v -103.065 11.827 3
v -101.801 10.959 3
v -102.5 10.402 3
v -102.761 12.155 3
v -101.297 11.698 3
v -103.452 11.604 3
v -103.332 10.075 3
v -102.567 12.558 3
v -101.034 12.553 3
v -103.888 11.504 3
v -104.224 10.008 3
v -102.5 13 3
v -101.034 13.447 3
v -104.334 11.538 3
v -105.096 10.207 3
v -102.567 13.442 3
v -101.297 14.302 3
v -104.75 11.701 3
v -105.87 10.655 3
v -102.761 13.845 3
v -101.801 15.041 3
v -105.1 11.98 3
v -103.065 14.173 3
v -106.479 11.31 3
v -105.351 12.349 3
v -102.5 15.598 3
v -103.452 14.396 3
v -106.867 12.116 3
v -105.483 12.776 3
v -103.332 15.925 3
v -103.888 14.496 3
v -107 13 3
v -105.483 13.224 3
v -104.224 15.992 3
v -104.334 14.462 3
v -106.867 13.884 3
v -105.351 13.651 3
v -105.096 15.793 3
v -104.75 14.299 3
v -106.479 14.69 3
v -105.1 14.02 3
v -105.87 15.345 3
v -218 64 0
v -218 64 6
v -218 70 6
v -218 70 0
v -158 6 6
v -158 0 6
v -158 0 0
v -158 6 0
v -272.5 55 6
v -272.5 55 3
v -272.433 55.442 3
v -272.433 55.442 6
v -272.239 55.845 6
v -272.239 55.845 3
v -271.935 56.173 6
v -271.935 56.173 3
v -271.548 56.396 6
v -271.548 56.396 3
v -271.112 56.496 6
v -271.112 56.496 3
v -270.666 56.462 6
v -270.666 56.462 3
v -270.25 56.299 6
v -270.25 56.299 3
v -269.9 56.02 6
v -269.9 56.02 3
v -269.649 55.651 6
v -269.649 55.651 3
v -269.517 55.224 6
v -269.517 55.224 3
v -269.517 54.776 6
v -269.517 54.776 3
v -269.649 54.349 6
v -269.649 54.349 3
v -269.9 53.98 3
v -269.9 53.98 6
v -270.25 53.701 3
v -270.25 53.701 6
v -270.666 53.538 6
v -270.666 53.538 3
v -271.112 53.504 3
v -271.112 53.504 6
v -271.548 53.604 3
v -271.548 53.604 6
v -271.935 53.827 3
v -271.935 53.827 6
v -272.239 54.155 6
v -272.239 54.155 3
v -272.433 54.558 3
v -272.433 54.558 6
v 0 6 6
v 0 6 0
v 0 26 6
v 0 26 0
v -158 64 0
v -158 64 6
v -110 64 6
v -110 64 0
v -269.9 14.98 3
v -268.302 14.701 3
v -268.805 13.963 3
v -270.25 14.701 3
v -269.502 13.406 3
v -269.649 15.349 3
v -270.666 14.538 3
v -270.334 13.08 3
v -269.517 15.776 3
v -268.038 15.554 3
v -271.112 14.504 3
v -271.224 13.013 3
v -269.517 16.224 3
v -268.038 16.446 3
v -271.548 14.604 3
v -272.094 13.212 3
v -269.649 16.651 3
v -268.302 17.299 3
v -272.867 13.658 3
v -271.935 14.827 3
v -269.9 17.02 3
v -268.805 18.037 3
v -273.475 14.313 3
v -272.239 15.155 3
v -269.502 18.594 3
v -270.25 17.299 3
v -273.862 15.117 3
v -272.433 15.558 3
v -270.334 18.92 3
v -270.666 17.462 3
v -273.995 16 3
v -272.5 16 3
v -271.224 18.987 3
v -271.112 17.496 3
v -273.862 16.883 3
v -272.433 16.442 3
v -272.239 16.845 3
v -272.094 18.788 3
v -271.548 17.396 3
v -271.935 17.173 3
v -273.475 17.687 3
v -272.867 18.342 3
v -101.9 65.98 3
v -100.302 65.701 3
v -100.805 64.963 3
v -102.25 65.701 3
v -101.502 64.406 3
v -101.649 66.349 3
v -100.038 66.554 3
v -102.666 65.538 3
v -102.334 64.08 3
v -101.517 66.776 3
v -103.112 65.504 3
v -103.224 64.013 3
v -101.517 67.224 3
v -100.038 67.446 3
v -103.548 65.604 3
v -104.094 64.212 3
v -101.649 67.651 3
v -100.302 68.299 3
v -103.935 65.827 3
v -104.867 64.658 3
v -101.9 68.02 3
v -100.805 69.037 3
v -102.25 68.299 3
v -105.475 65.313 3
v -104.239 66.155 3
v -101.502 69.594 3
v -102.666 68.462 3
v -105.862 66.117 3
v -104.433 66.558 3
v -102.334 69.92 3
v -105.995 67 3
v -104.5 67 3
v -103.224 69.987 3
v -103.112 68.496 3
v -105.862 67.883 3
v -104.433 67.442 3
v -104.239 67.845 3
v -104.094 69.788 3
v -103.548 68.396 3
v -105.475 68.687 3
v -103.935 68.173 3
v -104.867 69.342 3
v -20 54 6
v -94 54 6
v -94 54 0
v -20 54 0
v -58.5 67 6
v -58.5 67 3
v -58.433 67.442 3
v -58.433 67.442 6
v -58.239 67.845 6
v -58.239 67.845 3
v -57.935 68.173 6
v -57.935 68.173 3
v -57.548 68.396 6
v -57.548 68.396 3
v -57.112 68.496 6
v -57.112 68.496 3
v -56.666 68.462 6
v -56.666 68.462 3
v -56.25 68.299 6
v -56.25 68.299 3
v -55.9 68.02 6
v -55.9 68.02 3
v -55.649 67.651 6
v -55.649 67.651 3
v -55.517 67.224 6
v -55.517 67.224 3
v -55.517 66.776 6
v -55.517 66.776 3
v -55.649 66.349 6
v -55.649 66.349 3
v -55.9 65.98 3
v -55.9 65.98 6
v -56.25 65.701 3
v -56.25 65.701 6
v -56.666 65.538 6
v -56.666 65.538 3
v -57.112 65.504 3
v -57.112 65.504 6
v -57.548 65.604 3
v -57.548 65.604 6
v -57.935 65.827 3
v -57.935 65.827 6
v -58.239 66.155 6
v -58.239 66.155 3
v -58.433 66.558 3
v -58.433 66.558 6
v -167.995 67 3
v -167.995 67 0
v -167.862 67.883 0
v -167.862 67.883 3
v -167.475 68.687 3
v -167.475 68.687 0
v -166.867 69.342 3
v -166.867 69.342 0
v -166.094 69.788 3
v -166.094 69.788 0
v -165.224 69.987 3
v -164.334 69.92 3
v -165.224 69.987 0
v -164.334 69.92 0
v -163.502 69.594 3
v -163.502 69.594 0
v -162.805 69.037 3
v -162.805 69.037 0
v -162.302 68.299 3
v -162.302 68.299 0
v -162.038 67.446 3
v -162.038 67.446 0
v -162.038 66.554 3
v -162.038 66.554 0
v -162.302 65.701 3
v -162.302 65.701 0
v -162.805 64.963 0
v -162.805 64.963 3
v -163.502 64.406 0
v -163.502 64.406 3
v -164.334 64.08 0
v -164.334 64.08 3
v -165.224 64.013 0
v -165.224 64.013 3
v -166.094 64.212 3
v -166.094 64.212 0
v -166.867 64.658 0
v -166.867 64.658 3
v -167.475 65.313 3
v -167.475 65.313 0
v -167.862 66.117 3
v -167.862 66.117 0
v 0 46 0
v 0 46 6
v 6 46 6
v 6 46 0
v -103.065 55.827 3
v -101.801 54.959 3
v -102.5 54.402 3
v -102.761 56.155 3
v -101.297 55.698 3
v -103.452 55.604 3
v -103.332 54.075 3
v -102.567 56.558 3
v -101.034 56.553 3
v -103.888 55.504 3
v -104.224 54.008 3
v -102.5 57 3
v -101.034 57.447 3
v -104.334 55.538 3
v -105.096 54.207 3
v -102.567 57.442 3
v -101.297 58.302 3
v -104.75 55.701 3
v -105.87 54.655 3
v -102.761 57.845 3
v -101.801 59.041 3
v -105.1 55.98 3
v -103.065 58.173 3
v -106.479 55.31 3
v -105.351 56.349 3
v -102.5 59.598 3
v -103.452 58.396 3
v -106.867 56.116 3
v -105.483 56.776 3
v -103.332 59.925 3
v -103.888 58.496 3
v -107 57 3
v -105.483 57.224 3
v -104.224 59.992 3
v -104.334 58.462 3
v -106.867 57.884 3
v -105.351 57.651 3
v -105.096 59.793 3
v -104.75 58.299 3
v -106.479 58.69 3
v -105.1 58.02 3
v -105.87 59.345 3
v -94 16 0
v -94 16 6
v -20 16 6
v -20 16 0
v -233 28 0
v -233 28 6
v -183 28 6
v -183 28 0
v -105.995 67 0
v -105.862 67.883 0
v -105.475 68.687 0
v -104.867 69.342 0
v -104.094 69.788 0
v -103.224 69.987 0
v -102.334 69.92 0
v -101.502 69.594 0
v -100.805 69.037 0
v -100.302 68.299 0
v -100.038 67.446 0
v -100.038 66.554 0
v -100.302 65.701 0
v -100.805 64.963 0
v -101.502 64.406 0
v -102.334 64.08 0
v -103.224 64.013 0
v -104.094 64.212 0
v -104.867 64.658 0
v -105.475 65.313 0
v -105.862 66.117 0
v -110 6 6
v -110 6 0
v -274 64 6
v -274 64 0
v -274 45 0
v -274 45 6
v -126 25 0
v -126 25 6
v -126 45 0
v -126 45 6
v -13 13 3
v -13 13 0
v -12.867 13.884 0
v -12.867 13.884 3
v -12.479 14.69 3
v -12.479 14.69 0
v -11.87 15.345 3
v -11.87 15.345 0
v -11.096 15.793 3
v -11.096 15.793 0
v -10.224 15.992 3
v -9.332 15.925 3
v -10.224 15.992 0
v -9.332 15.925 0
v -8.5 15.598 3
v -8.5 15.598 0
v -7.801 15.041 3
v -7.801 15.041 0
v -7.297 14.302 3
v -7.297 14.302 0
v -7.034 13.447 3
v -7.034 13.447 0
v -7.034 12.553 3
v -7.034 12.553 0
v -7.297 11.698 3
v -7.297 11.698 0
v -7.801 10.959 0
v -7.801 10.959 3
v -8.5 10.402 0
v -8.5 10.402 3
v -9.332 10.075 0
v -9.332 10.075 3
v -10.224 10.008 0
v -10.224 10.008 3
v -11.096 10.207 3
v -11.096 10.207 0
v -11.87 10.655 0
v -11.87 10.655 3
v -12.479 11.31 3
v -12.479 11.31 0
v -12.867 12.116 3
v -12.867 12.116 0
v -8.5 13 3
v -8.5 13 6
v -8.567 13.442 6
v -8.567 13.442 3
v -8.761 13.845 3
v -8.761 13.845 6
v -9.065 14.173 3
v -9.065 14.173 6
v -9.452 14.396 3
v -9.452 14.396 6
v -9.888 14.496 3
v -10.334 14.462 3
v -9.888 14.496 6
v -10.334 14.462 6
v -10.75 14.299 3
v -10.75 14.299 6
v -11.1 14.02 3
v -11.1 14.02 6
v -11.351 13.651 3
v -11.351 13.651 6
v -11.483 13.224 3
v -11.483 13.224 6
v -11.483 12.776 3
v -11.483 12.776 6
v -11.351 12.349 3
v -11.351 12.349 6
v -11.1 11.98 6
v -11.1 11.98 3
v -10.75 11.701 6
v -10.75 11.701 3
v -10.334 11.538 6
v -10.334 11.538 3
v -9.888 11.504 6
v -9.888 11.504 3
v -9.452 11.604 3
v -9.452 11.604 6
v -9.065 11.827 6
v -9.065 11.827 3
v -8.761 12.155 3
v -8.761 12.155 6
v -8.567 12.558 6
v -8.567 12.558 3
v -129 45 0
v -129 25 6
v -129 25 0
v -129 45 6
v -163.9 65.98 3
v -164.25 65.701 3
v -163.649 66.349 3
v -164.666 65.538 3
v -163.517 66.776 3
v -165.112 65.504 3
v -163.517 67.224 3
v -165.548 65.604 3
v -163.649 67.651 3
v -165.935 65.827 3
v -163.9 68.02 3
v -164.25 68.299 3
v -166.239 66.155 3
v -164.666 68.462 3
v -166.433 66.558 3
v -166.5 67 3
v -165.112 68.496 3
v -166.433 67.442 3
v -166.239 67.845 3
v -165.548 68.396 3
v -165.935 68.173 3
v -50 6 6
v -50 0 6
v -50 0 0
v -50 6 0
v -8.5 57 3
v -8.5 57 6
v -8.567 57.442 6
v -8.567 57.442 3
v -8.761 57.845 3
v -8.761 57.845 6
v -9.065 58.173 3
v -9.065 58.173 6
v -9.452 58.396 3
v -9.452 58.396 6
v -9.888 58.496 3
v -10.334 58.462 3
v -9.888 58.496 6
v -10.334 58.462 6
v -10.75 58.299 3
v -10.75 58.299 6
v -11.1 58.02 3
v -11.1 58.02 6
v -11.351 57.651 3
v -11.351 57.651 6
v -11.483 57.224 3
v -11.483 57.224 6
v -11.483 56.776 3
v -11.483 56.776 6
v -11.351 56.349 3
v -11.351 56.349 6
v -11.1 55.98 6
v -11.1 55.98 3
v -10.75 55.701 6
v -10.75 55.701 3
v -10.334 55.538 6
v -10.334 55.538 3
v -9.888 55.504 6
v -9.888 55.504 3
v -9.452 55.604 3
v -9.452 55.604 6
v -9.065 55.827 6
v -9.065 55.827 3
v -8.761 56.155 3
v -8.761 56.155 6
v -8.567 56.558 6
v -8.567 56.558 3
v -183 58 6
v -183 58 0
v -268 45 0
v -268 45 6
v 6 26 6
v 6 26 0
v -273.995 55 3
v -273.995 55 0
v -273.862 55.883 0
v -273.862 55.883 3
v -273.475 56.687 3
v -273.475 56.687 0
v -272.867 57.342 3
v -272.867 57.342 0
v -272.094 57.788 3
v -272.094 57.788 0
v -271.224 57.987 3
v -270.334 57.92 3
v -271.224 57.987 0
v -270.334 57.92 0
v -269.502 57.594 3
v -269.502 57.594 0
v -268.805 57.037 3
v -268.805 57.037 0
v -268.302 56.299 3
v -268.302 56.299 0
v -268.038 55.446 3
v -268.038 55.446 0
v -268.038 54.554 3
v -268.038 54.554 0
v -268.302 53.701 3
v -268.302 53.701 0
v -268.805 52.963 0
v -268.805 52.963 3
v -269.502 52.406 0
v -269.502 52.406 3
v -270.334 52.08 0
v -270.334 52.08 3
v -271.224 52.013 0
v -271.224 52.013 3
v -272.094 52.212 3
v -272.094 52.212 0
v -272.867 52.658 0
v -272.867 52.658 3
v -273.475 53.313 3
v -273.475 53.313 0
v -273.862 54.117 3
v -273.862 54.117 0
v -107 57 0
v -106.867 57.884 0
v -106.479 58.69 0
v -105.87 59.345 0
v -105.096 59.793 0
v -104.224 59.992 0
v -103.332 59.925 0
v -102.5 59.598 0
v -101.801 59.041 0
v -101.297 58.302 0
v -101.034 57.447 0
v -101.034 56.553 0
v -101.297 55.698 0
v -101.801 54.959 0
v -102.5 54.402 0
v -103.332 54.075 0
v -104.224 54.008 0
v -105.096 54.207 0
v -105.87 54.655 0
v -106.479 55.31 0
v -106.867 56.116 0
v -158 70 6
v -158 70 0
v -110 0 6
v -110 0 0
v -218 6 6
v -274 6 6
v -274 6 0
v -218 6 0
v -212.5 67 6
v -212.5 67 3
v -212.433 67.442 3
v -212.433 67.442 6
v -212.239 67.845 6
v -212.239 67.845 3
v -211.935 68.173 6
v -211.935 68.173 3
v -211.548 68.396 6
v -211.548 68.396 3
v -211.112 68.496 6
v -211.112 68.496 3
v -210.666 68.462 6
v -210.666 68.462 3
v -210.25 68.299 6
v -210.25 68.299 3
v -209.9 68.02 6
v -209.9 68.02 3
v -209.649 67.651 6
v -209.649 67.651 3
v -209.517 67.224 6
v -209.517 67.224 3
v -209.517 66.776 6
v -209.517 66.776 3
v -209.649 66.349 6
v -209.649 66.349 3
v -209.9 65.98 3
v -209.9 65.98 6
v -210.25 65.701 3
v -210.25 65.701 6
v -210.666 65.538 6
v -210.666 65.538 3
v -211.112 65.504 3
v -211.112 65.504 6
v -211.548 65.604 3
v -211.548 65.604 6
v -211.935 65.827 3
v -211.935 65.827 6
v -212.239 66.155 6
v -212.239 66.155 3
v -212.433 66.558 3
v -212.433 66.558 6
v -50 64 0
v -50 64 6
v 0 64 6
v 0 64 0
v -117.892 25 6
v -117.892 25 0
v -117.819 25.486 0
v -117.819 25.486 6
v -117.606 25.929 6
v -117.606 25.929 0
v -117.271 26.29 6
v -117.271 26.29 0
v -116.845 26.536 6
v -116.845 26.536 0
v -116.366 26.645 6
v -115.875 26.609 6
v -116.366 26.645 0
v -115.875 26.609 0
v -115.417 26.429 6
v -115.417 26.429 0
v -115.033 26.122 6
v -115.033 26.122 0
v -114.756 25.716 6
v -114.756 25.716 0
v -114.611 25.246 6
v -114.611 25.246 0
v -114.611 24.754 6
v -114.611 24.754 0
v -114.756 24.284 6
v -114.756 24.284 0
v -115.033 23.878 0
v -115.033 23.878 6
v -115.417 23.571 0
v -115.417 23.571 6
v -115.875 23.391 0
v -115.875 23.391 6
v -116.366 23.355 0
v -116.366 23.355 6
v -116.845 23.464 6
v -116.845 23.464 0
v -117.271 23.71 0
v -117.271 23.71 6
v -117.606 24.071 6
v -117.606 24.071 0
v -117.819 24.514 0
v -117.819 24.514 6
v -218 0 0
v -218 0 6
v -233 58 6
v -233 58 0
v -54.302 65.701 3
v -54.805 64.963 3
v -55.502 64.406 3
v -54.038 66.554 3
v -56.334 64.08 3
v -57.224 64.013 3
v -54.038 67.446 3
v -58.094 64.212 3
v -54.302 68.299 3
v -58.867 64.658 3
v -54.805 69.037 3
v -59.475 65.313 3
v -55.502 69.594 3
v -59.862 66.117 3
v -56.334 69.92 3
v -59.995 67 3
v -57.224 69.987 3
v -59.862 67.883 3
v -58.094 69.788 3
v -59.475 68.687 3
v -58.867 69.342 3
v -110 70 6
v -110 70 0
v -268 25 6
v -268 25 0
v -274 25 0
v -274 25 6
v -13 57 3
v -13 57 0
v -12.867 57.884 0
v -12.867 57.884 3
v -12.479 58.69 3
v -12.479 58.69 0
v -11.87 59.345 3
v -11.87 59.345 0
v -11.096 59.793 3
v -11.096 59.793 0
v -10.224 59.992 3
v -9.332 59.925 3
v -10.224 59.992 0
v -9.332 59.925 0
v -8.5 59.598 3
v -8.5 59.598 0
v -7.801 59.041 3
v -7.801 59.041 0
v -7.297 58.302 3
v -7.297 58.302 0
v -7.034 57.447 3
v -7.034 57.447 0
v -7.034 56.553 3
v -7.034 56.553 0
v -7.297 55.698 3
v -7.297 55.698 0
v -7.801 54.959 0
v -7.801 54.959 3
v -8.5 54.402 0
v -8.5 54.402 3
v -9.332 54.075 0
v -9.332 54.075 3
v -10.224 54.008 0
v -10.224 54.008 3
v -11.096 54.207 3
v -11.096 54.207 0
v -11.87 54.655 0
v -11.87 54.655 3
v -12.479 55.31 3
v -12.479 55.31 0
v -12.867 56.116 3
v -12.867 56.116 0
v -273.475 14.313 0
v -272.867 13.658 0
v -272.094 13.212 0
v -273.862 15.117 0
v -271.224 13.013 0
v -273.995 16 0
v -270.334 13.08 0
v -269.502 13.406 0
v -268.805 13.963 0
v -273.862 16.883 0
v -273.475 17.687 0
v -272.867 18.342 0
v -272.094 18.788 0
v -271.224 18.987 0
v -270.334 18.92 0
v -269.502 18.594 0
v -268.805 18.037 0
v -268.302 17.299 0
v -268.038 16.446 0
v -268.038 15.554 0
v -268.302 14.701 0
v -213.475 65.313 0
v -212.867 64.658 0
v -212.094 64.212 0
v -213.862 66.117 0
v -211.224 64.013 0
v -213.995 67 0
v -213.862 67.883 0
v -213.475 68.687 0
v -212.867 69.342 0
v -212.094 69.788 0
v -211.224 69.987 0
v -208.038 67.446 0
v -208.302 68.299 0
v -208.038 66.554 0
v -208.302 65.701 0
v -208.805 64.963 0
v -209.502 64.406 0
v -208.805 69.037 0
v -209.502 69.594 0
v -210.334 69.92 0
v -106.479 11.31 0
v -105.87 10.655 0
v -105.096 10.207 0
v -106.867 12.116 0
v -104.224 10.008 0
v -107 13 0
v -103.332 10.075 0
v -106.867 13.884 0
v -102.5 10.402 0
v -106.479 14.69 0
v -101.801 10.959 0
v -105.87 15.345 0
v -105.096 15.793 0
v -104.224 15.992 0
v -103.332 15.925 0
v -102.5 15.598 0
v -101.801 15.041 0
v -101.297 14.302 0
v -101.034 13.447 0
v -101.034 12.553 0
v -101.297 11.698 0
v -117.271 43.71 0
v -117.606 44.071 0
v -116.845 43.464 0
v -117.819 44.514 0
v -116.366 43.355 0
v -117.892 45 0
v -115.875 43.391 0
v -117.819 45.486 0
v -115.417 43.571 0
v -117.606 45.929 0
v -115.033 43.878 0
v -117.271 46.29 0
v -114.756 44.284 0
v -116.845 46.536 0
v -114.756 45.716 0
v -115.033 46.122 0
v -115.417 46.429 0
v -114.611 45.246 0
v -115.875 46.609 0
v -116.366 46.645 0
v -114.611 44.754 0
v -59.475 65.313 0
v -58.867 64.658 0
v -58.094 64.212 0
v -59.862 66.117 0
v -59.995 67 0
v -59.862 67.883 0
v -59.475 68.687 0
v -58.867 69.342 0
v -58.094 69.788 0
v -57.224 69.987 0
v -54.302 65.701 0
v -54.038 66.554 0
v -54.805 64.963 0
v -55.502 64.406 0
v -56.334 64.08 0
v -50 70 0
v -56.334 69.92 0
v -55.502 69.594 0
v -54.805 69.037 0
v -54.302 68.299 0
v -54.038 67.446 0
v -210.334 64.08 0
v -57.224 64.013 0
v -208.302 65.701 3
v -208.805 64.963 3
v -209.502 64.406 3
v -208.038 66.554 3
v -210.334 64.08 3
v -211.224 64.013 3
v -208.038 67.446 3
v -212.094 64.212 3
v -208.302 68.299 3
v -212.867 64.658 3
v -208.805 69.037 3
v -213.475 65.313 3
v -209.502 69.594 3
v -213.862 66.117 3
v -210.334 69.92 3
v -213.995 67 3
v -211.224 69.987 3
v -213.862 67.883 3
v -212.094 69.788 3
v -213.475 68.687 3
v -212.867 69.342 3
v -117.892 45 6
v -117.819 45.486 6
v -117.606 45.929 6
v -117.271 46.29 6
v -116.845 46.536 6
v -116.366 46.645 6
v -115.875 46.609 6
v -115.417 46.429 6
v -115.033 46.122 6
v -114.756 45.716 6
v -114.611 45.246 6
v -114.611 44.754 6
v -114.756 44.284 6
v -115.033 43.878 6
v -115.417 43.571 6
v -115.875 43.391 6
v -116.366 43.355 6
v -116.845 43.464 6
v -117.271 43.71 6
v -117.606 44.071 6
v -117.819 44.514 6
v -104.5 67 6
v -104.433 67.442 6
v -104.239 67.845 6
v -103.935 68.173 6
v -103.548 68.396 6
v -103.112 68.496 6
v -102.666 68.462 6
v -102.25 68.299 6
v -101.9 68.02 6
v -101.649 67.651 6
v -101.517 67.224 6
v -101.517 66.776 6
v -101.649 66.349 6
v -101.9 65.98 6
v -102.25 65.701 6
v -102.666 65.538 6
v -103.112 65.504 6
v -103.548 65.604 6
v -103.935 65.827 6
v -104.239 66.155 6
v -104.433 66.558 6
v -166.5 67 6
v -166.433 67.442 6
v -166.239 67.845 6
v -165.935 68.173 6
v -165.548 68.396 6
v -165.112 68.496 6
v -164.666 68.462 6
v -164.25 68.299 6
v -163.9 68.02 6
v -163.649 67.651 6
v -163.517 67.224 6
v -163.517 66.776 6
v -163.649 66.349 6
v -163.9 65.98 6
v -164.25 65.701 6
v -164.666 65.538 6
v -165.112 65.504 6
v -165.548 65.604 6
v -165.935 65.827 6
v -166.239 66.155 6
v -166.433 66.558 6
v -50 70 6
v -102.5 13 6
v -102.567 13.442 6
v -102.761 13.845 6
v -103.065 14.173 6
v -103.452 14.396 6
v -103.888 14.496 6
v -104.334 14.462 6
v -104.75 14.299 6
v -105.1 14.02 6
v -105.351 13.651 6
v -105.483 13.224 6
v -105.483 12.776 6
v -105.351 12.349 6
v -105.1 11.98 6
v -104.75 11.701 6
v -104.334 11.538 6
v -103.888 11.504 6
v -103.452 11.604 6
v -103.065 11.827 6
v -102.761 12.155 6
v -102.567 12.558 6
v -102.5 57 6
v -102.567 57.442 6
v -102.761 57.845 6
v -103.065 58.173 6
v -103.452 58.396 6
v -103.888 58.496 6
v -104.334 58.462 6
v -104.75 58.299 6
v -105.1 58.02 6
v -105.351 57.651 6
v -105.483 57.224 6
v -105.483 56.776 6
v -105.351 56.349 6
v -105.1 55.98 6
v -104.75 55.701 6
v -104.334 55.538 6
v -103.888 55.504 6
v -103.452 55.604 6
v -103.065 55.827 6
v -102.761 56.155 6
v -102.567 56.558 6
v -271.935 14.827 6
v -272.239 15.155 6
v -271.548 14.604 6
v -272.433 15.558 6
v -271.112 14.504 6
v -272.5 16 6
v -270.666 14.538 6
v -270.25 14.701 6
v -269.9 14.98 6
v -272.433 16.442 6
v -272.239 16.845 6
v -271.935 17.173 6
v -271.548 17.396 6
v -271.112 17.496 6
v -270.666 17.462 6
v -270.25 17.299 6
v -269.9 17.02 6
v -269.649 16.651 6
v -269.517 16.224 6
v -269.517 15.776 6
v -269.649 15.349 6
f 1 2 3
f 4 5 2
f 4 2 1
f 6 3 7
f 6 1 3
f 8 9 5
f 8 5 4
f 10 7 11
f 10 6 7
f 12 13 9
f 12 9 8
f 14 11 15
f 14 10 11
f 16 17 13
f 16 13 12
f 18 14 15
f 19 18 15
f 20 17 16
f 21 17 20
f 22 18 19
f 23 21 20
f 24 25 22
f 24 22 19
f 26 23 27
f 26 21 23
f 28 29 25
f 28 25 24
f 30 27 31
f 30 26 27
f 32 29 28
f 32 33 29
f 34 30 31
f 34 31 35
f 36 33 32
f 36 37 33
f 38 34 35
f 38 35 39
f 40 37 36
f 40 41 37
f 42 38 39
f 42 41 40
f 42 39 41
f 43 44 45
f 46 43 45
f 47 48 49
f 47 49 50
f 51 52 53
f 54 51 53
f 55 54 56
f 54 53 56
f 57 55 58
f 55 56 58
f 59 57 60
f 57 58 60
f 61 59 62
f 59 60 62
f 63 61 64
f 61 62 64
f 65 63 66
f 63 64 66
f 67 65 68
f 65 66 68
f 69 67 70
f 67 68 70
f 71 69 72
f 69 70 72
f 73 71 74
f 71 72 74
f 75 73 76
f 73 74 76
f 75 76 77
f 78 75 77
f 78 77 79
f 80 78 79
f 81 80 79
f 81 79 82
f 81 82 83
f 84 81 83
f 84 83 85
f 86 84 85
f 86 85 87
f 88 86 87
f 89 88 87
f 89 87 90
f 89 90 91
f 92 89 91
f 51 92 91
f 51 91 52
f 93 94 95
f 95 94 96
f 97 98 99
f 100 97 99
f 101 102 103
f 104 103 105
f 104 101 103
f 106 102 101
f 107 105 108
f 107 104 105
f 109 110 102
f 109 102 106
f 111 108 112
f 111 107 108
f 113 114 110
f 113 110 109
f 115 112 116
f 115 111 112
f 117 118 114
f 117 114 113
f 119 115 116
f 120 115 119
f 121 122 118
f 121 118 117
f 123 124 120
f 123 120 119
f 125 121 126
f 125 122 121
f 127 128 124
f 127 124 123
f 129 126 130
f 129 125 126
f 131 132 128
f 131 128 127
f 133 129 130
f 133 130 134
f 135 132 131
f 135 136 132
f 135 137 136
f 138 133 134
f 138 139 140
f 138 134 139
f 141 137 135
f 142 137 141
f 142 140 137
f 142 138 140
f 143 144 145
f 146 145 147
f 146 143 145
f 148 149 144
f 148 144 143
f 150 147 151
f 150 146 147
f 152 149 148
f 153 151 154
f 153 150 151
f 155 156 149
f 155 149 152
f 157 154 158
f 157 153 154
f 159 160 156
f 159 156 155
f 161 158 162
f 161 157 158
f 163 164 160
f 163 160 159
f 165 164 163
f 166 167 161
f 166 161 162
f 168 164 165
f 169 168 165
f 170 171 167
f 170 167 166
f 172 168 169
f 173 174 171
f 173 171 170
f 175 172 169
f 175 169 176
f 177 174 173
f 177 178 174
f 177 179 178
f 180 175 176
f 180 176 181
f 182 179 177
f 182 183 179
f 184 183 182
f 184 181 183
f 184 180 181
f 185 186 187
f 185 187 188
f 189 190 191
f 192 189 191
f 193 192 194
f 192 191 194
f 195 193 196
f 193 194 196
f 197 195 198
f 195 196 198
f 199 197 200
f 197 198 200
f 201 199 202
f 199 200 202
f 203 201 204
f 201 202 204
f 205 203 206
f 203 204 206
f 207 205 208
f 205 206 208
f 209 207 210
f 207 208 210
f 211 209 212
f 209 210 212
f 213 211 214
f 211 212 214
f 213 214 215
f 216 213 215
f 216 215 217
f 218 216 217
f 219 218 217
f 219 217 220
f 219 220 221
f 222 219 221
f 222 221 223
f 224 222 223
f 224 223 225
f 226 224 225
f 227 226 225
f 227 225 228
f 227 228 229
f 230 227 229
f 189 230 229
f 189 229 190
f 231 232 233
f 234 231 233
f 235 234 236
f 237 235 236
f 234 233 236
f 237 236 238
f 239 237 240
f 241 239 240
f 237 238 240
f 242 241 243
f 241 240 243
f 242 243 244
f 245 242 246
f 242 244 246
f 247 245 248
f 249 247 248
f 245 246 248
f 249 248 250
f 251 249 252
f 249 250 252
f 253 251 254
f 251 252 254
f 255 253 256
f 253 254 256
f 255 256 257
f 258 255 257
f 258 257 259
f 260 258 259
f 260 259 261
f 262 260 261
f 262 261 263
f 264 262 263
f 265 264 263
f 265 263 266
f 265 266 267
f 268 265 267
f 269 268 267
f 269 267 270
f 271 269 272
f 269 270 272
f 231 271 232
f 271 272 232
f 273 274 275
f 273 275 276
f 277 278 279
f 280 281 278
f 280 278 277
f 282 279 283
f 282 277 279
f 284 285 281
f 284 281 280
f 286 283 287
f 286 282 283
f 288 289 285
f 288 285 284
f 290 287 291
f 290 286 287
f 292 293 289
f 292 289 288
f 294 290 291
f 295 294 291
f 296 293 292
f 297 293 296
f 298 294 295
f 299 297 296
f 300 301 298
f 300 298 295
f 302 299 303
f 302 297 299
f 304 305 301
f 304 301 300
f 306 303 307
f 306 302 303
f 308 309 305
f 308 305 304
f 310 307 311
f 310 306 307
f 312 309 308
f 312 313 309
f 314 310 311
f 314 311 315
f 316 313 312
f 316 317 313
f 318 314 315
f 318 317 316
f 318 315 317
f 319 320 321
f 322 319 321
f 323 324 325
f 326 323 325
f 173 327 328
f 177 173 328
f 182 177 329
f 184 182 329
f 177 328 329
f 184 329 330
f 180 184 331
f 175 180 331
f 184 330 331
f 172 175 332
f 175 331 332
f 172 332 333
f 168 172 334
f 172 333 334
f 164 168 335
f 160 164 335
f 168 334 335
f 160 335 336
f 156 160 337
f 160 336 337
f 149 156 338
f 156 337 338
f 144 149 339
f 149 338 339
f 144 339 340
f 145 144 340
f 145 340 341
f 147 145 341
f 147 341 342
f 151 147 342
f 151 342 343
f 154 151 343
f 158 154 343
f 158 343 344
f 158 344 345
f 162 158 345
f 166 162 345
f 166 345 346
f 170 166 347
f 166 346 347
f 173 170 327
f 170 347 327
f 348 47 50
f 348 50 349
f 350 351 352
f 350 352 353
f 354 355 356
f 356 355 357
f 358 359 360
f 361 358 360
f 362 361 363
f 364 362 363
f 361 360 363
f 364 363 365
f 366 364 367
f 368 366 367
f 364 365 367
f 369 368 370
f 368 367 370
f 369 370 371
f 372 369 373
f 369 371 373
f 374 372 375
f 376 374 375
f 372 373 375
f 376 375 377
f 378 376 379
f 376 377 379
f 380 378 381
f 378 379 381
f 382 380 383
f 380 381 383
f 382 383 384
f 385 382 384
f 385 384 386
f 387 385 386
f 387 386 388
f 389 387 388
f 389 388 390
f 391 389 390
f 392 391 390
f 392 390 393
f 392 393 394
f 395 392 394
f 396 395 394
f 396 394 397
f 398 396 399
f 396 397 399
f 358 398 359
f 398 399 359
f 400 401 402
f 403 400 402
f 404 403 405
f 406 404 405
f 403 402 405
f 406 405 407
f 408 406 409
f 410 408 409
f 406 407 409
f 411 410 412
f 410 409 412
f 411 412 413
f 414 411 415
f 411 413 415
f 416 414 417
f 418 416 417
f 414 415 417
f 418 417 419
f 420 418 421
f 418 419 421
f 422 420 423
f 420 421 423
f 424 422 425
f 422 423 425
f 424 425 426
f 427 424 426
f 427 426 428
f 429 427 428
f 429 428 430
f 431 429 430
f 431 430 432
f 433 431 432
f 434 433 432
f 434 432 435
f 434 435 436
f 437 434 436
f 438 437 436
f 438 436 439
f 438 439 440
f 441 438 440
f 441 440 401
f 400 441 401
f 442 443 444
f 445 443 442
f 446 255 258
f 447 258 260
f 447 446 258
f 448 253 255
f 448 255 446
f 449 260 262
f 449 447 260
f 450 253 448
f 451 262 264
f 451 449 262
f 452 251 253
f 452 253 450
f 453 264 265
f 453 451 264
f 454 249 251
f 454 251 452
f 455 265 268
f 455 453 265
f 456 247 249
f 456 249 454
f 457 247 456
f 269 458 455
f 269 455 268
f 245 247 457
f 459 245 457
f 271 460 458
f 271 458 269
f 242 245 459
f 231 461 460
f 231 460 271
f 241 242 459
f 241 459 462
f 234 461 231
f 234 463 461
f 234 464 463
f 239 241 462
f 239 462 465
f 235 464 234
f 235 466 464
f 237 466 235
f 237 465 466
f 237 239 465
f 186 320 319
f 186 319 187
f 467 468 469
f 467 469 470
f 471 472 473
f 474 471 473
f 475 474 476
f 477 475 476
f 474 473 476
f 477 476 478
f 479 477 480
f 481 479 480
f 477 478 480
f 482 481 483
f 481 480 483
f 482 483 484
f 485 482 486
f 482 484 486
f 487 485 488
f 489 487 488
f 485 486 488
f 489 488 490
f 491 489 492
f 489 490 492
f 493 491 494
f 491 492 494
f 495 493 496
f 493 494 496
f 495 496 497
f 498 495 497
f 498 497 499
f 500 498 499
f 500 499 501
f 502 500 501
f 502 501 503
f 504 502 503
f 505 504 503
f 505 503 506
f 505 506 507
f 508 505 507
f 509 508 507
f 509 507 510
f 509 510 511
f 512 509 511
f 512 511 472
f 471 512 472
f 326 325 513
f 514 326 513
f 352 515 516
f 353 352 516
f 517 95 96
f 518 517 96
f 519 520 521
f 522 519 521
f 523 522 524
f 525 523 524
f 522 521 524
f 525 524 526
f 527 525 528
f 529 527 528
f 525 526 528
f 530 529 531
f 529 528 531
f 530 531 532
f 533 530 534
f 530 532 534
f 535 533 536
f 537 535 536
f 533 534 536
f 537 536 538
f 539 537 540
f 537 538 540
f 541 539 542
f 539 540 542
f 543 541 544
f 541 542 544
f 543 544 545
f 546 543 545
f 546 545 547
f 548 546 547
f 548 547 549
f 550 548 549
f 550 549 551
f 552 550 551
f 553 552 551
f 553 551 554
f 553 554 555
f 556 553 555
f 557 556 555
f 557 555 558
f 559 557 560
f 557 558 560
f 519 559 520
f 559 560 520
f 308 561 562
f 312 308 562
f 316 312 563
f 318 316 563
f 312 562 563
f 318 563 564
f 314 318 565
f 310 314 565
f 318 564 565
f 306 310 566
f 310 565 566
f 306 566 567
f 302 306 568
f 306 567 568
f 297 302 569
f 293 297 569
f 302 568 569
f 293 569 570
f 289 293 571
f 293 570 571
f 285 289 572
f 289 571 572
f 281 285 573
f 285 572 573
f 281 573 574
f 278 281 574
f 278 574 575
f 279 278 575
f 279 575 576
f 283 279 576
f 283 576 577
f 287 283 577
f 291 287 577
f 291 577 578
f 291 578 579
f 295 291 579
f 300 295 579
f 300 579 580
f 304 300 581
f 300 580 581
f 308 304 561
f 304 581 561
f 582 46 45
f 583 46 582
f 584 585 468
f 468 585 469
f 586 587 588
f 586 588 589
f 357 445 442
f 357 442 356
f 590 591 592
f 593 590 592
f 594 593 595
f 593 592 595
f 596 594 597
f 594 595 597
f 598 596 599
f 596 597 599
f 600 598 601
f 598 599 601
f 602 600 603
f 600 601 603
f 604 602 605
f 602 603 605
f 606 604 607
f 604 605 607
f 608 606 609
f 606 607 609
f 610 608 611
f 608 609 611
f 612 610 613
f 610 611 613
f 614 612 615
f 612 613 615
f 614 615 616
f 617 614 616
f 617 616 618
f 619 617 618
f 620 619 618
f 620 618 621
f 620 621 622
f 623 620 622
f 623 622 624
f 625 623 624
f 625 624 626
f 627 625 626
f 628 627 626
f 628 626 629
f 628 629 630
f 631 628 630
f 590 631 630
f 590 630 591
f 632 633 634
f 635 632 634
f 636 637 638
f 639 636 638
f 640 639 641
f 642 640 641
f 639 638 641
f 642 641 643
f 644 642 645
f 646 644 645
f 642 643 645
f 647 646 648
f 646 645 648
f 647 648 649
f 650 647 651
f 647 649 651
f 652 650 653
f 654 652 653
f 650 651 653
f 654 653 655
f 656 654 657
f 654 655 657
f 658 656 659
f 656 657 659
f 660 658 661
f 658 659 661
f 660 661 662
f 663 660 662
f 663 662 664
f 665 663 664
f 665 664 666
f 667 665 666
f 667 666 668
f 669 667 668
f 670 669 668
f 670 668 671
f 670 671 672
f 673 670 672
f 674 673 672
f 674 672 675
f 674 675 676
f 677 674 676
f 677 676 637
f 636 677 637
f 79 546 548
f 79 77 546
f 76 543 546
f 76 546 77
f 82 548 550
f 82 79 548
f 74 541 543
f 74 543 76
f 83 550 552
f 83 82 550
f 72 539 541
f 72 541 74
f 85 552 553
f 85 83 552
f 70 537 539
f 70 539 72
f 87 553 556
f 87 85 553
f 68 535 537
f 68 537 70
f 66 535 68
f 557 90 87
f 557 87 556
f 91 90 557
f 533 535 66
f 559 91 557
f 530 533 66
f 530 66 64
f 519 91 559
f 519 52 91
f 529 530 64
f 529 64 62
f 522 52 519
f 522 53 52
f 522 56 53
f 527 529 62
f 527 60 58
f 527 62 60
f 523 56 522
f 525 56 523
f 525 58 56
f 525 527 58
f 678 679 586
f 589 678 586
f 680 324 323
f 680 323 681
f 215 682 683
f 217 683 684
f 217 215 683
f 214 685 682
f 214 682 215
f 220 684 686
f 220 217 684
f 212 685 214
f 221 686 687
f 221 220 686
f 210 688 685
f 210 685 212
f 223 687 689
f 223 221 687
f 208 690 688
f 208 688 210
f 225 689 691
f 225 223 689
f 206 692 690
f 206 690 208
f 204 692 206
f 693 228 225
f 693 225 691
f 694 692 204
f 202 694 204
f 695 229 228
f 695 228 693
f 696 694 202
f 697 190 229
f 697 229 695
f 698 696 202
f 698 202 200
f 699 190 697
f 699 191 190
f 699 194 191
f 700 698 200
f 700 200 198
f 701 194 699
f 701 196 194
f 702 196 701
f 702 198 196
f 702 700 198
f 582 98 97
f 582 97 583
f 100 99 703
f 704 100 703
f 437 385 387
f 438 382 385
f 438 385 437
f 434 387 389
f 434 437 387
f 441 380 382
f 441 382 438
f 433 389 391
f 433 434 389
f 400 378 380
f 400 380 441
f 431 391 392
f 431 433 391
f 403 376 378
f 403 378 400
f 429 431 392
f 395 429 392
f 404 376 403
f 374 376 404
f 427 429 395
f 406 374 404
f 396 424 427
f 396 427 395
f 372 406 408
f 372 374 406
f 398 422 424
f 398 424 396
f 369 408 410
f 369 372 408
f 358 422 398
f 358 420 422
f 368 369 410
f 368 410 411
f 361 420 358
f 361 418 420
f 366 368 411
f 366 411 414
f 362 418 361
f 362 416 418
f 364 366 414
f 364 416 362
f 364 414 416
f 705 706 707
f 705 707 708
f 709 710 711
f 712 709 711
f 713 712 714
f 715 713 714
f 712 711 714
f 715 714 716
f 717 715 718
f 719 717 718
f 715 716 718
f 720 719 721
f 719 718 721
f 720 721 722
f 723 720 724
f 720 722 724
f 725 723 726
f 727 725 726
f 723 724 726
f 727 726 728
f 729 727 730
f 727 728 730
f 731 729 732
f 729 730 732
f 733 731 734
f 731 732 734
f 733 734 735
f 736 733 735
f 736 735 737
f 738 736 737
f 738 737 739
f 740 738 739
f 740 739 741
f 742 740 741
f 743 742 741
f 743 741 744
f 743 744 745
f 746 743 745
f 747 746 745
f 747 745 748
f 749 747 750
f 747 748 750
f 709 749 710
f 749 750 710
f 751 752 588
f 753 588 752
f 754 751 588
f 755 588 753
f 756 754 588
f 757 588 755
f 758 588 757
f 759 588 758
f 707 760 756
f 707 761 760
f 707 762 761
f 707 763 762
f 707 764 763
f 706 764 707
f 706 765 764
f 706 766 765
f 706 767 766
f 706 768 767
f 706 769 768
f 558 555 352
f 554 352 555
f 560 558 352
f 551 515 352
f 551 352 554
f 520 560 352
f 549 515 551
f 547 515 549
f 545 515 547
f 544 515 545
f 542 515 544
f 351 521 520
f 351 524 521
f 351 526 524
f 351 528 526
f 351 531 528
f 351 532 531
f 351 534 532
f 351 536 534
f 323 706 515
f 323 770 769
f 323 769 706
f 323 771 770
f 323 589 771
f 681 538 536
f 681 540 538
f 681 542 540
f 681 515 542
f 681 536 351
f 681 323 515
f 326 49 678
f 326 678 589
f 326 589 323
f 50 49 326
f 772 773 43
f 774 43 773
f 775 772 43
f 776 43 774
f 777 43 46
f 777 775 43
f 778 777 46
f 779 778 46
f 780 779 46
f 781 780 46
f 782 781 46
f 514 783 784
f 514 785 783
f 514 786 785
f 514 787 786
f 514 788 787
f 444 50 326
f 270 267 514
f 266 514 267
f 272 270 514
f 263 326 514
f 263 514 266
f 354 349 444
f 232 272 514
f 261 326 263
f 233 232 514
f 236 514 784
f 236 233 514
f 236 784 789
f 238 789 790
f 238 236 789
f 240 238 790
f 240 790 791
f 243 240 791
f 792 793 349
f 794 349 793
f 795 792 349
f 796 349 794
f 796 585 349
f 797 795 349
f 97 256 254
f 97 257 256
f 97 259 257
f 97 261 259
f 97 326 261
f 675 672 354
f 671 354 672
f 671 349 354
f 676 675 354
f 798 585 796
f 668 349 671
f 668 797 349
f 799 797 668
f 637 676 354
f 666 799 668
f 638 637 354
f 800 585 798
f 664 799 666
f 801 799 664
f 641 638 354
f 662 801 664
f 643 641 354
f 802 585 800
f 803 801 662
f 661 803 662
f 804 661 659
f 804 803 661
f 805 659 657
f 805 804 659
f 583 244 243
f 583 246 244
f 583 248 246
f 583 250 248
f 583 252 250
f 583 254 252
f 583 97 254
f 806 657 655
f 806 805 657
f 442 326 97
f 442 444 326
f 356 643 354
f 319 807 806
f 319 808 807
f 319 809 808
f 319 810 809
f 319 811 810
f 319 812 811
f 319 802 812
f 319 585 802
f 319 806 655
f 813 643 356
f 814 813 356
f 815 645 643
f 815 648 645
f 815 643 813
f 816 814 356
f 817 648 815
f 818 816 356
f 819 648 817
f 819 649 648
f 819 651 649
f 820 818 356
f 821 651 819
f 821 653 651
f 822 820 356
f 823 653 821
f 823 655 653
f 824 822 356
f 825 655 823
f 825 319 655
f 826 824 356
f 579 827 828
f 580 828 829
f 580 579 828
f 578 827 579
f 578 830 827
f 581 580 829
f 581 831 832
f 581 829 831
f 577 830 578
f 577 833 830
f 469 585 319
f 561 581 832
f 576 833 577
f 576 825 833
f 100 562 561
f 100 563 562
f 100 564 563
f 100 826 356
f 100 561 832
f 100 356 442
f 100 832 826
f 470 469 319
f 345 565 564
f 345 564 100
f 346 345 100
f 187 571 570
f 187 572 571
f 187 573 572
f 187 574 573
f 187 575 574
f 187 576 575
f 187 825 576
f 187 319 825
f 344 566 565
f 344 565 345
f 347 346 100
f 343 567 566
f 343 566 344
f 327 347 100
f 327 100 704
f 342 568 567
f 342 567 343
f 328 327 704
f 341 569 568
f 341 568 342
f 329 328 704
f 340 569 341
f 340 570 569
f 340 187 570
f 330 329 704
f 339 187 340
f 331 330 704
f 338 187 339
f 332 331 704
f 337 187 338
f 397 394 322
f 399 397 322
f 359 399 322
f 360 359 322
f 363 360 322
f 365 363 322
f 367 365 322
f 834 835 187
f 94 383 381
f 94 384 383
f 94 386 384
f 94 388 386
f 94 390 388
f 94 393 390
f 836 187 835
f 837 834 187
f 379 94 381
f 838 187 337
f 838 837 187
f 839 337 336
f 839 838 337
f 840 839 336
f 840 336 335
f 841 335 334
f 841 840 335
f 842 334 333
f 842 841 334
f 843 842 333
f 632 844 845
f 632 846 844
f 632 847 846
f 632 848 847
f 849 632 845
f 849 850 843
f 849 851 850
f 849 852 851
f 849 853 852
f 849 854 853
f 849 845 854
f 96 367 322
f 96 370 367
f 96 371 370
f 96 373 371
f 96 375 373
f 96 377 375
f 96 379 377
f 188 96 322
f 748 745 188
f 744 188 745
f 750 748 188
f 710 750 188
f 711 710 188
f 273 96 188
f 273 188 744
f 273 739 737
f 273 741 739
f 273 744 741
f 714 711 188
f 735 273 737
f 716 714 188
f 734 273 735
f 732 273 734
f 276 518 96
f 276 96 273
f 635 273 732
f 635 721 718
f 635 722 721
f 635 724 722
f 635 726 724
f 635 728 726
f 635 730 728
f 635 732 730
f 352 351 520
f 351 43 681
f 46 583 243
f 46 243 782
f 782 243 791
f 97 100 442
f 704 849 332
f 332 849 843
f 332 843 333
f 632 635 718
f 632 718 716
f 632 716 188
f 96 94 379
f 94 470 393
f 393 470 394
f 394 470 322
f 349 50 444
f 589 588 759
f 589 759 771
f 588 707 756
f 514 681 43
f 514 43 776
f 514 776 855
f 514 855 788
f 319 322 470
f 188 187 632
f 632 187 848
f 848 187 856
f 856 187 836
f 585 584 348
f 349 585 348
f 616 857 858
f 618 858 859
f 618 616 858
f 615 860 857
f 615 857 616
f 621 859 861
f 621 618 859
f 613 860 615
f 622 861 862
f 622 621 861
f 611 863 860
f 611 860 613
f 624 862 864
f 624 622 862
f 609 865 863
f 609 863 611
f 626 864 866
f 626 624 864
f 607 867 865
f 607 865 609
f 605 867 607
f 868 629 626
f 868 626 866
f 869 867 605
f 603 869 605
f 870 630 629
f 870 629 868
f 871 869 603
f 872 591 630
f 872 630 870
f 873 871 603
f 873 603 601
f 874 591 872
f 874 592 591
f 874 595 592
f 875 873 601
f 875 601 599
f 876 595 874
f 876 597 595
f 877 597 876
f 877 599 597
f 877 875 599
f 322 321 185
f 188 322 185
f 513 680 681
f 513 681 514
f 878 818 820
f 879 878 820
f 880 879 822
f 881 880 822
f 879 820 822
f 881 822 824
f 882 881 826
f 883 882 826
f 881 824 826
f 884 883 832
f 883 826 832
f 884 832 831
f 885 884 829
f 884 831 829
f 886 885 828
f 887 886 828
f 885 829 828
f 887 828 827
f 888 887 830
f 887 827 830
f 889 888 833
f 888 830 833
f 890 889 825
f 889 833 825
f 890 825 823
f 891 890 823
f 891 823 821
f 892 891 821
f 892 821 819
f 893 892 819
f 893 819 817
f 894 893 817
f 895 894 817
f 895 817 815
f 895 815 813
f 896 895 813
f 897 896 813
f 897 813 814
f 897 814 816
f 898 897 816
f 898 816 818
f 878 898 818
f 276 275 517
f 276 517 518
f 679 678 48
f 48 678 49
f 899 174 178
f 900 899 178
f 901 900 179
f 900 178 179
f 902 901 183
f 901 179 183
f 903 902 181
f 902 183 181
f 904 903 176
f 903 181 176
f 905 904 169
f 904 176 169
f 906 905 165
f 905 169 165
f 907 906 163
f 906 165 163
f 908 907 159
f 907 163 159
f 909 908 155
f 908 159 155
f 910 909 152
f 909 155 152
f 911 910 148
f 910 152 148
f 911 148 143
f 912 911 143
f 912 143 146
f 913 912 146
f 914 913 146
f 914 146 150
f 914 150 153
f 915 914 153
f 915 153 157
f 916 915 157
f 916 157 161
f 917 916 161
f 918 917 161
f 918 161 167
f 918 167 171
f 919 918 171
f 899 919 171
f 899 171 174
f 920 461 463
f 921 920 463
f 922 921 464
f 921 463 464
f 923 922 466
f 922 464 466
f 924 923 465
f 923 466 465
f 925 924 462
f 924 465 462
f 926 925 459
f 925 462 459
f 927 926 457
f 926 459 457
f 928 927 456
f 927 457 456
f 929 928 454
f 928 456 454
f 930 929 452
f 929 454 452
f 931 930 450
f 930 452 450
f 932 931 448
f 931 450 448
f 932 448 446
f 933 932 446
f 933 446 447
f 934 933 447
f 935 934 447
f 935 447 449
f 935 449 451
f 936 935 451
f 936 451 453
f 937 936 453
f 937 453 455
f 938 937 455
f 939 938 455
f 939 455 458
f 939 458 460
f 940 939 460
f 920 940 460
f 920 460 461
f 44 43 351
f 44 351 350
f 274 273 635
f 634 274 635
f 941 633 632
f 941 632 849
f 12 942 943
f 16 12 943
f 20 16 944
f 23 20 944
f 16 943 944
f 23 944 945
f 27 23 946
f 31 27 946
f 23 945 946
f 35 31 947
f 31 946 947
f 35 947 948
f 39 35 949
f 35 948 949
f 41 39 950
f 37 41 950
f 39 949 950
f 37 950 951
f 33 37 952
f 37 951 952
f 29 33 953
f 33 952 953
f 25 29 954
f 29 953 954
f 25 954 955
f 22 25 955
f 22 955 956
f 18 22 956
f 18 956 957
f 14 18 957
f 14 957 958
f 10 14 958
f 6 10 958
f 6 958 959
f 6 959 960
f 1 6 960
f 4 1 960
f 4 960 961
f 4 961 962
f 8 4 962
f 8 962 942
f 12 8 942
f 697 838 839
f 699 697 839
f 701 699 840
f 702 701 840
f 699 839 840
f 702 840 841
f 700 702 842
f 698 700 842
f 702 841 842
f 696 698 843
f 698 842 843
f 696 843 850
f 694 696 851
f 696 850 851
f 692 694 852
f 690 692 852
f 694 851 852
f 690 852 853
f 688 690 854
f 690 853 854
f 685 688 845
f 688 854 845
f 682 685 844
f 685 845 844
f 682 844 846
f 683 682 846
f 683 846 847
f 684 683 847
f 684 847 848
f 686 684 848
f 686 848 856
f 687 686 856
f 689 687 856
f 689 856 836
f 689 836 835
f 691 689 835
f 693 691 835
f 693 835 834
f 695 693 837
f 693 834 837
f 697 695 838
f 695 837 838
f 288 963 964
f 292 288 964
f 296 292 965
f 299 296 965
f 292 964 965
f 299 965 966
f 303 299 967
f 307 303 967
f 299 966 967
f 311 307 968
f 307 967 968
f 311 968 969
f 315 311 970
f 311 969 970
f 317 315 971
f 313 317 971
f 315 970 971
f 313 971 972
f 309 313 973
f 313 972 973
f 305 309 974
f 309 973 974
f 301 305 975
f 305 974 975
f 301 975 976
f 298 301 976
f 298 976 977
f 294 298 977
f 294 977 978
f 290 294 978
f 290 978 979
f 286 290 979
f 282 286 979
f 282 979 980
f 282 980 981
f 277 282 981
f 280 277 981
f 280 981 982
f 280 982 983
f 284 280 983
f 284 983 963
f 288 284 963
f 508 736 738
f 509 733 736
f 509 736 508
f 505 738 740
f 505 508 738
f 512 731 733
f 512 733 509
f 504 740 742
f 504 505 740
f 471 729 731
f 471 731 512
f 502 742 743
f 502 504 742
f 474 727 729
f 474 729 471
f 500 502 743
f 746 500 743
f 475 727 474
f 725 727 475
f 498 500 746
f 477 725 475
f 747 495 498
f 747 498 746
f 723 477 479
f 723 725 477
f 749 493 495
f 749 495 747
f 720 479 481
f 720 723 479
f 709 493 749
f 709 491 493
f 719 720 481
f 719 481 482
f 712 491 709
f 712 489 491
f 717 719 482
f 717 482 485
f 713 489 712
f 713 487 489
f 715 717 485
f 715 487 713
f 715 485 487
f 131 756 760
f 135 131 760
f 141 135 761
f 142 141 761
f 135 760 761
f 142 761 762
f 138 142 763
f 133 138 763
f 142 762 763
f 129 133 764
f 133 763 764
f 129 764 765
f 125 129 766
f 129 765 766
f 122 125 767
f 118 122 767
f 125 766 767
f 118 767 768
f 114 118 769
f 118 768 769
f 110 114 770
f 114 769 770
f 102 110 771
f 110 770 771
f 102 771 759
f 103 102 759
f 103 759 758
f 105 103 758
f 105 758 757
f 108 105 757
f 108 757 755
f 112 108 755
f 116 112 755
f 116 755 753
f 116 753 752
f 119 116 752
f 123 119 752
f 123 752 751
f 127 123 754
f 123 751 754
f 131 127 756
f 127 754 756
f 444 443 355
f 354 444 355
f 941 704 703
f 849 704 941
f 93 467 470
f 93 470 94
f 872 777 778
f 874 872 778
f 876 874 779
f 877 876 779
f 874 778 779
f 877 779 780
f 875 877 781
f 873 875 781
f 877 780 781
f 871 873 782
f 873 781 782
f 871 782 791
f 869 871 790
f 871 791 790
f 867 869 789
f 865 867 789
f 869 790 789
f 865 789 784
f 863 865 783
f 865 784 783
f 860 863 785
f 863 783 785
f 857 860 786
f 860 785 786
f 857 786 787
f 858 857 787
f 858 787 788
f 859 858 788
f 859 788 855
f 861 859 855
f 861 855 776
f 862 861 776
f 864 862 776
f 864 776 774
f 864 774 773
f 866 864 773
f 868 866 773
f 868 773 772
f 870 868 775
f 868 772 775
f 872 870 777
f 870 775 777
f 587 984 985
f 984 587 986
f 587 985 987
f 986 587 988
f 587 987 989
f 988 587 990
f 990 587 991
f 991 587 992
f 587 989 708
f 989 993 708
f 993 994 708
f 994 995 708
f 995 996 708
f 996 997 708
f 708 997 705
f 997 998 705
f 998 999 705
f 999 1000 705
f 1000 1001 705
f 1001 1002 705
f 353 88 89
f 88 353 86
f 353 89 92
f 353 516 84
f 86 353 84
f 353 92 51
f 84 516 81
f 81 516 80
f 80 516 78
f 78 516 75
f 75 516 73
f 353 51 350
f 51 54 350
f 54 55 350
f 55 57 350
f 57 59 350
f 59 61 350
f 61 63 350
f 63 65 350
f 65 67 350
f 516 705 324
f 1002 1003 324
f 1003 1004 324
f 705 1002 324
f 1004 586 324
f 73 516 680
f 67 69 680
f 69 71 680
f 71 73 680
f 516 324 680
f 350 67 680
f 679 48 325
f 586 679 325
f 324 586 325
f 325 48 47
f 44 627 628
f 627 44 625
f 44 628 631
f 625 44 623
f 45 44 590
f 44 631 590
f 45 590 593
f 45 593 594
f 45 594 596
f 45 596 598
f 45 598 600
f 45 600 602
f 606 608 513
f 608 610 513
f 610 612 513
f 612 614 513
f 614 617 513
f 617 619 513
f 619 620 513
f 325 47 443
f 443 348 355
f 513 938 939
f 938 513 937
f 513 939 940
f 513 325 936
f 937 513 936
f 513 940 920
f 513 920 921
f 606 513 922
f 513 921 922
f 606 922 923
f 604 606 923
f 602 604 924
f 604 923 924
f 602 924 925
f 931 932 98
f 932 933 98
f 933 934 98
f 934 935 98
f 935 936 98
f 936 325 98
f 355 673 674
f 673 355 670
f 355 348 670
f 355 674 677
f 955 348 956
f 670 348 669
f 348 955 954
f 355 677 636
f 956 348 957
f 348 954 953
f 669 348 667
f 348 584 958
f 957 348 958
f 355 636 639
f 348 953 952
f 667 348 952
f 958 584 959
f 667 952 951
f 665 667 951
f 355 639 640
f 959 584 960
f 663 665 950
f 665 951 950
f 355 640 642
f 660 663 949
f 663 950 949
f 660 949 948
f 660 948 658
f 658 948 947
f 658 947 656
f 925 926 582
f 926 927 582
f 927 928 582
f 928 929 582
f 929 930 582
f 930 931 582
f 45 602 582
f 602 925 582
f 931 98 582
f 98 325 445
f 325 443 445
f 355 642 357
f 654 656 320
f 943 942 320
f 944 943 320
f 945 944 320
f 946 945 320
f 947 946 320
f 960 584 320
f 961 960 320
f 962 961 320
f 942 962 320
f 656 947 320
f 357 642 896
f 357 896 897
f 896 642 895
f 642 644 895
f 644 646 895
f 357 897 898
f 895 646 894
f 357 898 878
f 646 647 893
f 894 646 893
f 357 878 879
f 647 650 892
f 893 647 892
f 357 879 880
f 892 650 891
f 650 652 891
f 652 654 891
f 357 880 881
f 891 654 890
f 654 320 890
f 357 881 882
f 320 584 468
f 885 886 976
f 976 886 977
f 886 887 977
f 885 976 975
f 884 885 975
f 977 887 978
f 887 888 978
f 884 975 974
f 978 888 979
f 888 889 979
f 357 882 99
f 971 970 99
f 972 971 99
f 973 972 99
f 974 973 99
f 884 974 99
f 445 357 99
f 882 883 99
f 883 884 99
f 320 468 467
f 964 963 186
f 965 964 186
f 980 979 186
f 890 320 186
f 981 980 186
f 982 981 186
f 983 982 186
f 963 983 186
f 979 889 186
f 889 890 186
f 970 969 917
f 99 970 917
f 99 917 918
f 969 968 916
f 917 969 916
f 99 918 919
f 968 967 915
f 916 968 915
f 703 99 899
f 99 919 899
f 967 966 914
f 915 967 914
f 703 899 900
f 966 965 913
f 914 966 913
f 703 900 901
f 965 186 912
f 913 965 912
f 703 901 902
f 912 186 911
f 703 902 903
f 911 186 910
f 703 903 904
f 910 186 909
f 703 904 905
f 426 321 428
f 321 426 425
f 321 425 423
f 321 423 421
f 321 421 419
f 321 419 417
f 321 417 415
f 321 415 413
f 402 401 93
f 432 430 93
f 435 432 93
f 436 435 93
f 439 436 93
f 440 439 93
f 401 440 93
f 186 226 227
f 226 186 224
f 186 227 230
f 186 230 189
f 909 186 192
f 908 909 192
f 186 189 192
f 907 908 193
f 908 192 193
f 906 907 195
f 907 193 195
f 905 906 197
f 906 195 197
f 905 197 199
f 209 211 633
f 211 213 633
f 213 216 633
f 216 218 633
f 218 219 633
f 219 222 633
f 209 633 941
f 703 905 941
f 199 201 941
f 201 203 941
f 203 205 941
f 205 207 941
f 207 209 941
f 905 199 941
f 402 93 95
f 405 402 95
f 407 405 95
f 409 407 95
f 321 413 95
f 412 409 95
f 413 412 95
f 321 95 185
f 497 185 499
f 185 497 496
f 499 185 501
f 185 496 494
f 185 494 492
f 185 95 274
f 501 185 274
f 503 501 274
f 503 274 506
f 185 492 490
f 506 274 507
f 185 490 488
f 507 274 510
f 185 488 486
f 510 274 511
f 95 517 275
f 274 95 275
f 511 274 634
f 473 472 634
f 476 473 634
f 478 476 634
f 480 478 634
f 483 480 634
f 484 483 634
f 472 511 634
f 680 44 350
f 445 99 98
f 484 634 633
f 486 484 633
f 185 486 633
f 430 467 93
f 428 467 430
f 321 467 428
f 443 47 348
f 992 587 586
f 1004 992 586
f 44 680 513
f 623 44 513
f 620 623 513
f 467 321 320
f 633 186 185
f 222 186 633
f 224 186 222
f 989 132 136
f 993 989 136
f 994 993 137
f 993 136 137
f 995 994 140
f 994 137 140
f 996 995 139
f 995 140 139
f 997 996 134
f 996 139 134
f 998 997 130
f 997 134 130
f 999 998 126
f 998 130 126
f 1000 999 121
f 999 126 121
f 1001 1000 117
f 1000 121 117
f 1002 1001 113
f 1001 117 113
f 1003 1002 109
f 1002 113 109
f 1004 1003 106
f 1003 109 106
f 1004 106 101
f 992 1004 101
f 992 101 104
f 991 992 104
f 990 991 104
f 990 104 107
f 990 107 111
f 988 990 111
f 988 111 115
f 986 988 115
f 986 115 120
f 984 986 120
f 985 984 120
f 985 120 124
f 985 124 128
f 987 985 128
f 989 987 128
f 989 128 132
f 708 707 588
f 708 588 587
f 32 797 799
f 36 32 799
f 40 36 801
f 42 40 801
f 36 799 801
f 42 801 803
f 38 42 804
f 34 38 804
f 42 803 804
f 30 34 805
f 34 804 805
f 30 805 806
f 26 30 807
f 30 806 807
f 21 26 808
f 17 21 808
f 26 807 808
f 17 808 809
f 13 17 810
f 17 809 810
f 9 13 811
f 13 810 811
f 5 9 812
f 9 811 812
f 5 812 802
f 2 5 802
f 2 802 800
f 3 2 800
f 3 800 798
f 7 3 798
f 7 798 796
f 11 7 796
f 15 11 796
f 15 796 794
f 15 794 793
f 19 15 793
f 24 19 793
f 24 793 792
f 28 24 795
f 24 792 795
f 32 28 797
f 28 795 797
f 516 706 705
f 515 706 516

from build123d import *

# Parameters (mm, degrees)
ESQUISSE1_W             = 268
ESQUISSE1_H             = 70
BOSS_EXTRU_1_DEPTH      = 6
ESQUISSE2_W             = 50
ESQUISSE2_H             = 6
ESQUISSE2_W_2           = 48
ENL_V_MAT_EXTRU_1_DEPTH = 278.055951028
ESQUISSE3_W             = 6
ESQUISSE3_H             = 20
BOSS_EXTRU_2_DEPTH      = 6
ESQUISSE4_R             = 1.5
ESQUISSE4_W             = 74
ESQUISSE4_H             = 38
ESQUISSE4_W_2           = 3
ESQUISSE4_H_2           = 20
ESQUISSE4_W_3           = 50
ESQUISSE4_H_3           = 30
ENL_V_MAT_EXTRU_2_DEPTH = 10
ESQUISSE5_W             = 6
ESQUISSE5_H             = 19
BOSS_EXTRU_3_DEPTH      = 6
ESQUISSE6_R             = 1.5
ENL_V_MAT_EXTRU_3_DEPTH = 283.863924883
ESQUISSE7_R             = 2.995
ESQUISSE7_R_2           = 3
ENL_V_MAT_EXTRU_4_DEPTH = 3
ESQUISSE8_R             = 1.65
ENL_V_MAT_EXTRU_5_DEPTH = 283.863924883


with BuildPart() as part:
    # Esquisse1 → Boss.-Extru.1 (new body)
    with BuildSketch(Plane.XY):
        with Locations((-134, 35)):
            Rectangle(ESQUISSE1_W, ESQUISSE1_H)
    extrude(amount=BOSS_EXTRU_1_DEPTH)

    # Esquisse2 → Enlèv. mat.-Extru.1 (cut, through all)
    with BuildSketch(Plane.XY.offset(6)):
        with Locations((-243, 3)):
            Rectangle(ESQUISSE2_W, ESQUISSE2_H)
        with Locations((-25, 3)):
            Rectangle(ESQUISSE2_W, ESQUISSE2_H)
        with Locations((-134, 3)):
            Rectangle(ESQUISSE2_W_2, ESQUISSE2_H)
        with Locations((-243, 67)):
            Rectangle(ESQUISSE2_W, ESQUISSE2_H)
        with Locations((-134, 67)):
            Rectangle(ESQUISSE2_W_2, ESQUISSE2_H)
        with Locations((-25, 67)):
            Rectangle(ESQUISSE2_W, ESQUISSE2_H)
    extrude(amount=-ENL_V_MAT_EXTRU_1_DEPTH, mode=Mode.SUBTRACT)

    # Esquisse3 → Boss.-Extru.2 (add)
    with BuildSketch(Plane(origin=(0, 0, 0), x_dir=(0, 0, -1), z_dir=(1, 0, 0))):
        with Locations((-3, 36)):
            Rectangle(ESQUISSE3_W, ESQUISSE3_H)
    extrude(amount=BOSS_EXTRU_2_DEPTH)

    # Esquisse4 → Enlèv. mat.-Extru.2 (cut)
    with BuildSketch(Plane.XY.offset(6)):
        with Locations((-104, 57)):
            Circle(ESQUISSE4_R)
        with Locations((-104, 13)):
            Circle(ESQUISSE4_R)
        with Locations((-10, 57)):
            Circle(ESQUISSE4_R)
        with Locations((-10, 13)):
            Circle(ESQUISSE4_R)
        with Locations((-57, 35)):
            Rectangle(ESQUISSE4_W, ESQUISSE4_H)
        with Locations((-127.5, 35)):
            Rectangle(ESQUISSE4_W_2, ESQUISSE4_H_2)
        with Locations((-208, 43)):
            Rectangle(ESQUISSE4_W_3, ESQUISSE4_H_3)
    extrude(amount=-ENL_V_MAT_EXTRU_2_DEPTH, mode=Mode.SUBTRACT)

    # Esquisse5 → Boss.-Extru.3 (add)
    with BuildSketch(Plane.ZY.offset(268)):
        with Locations((3, 54.5)):
            Rectangle(ESQUISSE5_W, ESQUISSE5_H)
        with Locations((3, 15.5)):
            Rectangle(ESQUISSE5_W, ESQUISSE5_H)
    extrude(amount=BOSS_EXTRU_3_DEPTH)

    # Esquisse6 → Enlèv. mat.-Extru.3 (cut, through all)
    with BuildSketch(Plane(origin=(0, 0, 0), x_dir=(-1, 0, 0), z_dir=(0, 0, -1))):
        with Locations((271, 16)):
            Circle(ESQUISSE6_R)
        with Locations((271, 55)):
            Circle(ESQUISSE6_R)
        with Locations((211, 67)):
            Circle(ESQUISSE6_R)
        with Locations((165, 67)):
            Circle(ESQUISSE6_R)
        with Locations((103, 67)):
            Circle(ESQUISSE6_R)
        with Locations((57, 67)):
            Circle(ESQUISSE6_R)
    extrude(amount=-ENL_V_MAT_EXTRU_3_DEPTH, mode=Mode.SUBTRACT)

    # Esquisse7 → Enlèv. mat.-Extru.4 (cut)
    with BuildSketch(Plane(origin=(0, 0, 0), x_dir=(-1, 0, 0), z_dir=(0, 0, -1))):
        with Locations((271, 16)):
            Circle(ESQUISSE7_R)
        with Locations((271, 55)):
            Circle(ESQUISSE7_R)
        with Locations((211, 67)):
            Circle(ESQUISSE7_R)
        with Locations((165, 67)):
            Circle(ESQUISSE7_R)
        with Locations((103, 67)):
            Circle(ESQUISSE7_R)
        with Locations((57, 67)):
            Circle(ESQUISSE7_R)
        with Locations((104, 57)):
            Circle(ESQUISSE7_R_2)
        with Locations((104, 13)):
            Circle(ESQUISSE7_R_2)
        with Locations((10, 13)):
            Circle(ESQUISSE7_R_2)
        with Locations((10, 57)):
            Circle(ESQUISSE7_R_2)
    extrude(amount=-ENL_V_MAT_EXTRU_4_DEPTH, mode=Mode.SUBTRACT)

    # Esquisse8 → Enlèv. mat.-Extru.5 (cut, through all)
    with BuildSketch(Plane(origin=(0, 0, 0), x_dir=(-1, 0, 0), z_dir=(0, 0, -1))):
        with Locations((116.242255389, 25)):
            Circle(ESQUISSE8_R)
        with Locations((116.242255389, 45)):
            Circle(ESQUISSE8_R)
    extrude(amount=-ENL_V_MAT_EXTRU_5_DEPTH, mode=Mode.SUBTRACT)


solid = part.part
